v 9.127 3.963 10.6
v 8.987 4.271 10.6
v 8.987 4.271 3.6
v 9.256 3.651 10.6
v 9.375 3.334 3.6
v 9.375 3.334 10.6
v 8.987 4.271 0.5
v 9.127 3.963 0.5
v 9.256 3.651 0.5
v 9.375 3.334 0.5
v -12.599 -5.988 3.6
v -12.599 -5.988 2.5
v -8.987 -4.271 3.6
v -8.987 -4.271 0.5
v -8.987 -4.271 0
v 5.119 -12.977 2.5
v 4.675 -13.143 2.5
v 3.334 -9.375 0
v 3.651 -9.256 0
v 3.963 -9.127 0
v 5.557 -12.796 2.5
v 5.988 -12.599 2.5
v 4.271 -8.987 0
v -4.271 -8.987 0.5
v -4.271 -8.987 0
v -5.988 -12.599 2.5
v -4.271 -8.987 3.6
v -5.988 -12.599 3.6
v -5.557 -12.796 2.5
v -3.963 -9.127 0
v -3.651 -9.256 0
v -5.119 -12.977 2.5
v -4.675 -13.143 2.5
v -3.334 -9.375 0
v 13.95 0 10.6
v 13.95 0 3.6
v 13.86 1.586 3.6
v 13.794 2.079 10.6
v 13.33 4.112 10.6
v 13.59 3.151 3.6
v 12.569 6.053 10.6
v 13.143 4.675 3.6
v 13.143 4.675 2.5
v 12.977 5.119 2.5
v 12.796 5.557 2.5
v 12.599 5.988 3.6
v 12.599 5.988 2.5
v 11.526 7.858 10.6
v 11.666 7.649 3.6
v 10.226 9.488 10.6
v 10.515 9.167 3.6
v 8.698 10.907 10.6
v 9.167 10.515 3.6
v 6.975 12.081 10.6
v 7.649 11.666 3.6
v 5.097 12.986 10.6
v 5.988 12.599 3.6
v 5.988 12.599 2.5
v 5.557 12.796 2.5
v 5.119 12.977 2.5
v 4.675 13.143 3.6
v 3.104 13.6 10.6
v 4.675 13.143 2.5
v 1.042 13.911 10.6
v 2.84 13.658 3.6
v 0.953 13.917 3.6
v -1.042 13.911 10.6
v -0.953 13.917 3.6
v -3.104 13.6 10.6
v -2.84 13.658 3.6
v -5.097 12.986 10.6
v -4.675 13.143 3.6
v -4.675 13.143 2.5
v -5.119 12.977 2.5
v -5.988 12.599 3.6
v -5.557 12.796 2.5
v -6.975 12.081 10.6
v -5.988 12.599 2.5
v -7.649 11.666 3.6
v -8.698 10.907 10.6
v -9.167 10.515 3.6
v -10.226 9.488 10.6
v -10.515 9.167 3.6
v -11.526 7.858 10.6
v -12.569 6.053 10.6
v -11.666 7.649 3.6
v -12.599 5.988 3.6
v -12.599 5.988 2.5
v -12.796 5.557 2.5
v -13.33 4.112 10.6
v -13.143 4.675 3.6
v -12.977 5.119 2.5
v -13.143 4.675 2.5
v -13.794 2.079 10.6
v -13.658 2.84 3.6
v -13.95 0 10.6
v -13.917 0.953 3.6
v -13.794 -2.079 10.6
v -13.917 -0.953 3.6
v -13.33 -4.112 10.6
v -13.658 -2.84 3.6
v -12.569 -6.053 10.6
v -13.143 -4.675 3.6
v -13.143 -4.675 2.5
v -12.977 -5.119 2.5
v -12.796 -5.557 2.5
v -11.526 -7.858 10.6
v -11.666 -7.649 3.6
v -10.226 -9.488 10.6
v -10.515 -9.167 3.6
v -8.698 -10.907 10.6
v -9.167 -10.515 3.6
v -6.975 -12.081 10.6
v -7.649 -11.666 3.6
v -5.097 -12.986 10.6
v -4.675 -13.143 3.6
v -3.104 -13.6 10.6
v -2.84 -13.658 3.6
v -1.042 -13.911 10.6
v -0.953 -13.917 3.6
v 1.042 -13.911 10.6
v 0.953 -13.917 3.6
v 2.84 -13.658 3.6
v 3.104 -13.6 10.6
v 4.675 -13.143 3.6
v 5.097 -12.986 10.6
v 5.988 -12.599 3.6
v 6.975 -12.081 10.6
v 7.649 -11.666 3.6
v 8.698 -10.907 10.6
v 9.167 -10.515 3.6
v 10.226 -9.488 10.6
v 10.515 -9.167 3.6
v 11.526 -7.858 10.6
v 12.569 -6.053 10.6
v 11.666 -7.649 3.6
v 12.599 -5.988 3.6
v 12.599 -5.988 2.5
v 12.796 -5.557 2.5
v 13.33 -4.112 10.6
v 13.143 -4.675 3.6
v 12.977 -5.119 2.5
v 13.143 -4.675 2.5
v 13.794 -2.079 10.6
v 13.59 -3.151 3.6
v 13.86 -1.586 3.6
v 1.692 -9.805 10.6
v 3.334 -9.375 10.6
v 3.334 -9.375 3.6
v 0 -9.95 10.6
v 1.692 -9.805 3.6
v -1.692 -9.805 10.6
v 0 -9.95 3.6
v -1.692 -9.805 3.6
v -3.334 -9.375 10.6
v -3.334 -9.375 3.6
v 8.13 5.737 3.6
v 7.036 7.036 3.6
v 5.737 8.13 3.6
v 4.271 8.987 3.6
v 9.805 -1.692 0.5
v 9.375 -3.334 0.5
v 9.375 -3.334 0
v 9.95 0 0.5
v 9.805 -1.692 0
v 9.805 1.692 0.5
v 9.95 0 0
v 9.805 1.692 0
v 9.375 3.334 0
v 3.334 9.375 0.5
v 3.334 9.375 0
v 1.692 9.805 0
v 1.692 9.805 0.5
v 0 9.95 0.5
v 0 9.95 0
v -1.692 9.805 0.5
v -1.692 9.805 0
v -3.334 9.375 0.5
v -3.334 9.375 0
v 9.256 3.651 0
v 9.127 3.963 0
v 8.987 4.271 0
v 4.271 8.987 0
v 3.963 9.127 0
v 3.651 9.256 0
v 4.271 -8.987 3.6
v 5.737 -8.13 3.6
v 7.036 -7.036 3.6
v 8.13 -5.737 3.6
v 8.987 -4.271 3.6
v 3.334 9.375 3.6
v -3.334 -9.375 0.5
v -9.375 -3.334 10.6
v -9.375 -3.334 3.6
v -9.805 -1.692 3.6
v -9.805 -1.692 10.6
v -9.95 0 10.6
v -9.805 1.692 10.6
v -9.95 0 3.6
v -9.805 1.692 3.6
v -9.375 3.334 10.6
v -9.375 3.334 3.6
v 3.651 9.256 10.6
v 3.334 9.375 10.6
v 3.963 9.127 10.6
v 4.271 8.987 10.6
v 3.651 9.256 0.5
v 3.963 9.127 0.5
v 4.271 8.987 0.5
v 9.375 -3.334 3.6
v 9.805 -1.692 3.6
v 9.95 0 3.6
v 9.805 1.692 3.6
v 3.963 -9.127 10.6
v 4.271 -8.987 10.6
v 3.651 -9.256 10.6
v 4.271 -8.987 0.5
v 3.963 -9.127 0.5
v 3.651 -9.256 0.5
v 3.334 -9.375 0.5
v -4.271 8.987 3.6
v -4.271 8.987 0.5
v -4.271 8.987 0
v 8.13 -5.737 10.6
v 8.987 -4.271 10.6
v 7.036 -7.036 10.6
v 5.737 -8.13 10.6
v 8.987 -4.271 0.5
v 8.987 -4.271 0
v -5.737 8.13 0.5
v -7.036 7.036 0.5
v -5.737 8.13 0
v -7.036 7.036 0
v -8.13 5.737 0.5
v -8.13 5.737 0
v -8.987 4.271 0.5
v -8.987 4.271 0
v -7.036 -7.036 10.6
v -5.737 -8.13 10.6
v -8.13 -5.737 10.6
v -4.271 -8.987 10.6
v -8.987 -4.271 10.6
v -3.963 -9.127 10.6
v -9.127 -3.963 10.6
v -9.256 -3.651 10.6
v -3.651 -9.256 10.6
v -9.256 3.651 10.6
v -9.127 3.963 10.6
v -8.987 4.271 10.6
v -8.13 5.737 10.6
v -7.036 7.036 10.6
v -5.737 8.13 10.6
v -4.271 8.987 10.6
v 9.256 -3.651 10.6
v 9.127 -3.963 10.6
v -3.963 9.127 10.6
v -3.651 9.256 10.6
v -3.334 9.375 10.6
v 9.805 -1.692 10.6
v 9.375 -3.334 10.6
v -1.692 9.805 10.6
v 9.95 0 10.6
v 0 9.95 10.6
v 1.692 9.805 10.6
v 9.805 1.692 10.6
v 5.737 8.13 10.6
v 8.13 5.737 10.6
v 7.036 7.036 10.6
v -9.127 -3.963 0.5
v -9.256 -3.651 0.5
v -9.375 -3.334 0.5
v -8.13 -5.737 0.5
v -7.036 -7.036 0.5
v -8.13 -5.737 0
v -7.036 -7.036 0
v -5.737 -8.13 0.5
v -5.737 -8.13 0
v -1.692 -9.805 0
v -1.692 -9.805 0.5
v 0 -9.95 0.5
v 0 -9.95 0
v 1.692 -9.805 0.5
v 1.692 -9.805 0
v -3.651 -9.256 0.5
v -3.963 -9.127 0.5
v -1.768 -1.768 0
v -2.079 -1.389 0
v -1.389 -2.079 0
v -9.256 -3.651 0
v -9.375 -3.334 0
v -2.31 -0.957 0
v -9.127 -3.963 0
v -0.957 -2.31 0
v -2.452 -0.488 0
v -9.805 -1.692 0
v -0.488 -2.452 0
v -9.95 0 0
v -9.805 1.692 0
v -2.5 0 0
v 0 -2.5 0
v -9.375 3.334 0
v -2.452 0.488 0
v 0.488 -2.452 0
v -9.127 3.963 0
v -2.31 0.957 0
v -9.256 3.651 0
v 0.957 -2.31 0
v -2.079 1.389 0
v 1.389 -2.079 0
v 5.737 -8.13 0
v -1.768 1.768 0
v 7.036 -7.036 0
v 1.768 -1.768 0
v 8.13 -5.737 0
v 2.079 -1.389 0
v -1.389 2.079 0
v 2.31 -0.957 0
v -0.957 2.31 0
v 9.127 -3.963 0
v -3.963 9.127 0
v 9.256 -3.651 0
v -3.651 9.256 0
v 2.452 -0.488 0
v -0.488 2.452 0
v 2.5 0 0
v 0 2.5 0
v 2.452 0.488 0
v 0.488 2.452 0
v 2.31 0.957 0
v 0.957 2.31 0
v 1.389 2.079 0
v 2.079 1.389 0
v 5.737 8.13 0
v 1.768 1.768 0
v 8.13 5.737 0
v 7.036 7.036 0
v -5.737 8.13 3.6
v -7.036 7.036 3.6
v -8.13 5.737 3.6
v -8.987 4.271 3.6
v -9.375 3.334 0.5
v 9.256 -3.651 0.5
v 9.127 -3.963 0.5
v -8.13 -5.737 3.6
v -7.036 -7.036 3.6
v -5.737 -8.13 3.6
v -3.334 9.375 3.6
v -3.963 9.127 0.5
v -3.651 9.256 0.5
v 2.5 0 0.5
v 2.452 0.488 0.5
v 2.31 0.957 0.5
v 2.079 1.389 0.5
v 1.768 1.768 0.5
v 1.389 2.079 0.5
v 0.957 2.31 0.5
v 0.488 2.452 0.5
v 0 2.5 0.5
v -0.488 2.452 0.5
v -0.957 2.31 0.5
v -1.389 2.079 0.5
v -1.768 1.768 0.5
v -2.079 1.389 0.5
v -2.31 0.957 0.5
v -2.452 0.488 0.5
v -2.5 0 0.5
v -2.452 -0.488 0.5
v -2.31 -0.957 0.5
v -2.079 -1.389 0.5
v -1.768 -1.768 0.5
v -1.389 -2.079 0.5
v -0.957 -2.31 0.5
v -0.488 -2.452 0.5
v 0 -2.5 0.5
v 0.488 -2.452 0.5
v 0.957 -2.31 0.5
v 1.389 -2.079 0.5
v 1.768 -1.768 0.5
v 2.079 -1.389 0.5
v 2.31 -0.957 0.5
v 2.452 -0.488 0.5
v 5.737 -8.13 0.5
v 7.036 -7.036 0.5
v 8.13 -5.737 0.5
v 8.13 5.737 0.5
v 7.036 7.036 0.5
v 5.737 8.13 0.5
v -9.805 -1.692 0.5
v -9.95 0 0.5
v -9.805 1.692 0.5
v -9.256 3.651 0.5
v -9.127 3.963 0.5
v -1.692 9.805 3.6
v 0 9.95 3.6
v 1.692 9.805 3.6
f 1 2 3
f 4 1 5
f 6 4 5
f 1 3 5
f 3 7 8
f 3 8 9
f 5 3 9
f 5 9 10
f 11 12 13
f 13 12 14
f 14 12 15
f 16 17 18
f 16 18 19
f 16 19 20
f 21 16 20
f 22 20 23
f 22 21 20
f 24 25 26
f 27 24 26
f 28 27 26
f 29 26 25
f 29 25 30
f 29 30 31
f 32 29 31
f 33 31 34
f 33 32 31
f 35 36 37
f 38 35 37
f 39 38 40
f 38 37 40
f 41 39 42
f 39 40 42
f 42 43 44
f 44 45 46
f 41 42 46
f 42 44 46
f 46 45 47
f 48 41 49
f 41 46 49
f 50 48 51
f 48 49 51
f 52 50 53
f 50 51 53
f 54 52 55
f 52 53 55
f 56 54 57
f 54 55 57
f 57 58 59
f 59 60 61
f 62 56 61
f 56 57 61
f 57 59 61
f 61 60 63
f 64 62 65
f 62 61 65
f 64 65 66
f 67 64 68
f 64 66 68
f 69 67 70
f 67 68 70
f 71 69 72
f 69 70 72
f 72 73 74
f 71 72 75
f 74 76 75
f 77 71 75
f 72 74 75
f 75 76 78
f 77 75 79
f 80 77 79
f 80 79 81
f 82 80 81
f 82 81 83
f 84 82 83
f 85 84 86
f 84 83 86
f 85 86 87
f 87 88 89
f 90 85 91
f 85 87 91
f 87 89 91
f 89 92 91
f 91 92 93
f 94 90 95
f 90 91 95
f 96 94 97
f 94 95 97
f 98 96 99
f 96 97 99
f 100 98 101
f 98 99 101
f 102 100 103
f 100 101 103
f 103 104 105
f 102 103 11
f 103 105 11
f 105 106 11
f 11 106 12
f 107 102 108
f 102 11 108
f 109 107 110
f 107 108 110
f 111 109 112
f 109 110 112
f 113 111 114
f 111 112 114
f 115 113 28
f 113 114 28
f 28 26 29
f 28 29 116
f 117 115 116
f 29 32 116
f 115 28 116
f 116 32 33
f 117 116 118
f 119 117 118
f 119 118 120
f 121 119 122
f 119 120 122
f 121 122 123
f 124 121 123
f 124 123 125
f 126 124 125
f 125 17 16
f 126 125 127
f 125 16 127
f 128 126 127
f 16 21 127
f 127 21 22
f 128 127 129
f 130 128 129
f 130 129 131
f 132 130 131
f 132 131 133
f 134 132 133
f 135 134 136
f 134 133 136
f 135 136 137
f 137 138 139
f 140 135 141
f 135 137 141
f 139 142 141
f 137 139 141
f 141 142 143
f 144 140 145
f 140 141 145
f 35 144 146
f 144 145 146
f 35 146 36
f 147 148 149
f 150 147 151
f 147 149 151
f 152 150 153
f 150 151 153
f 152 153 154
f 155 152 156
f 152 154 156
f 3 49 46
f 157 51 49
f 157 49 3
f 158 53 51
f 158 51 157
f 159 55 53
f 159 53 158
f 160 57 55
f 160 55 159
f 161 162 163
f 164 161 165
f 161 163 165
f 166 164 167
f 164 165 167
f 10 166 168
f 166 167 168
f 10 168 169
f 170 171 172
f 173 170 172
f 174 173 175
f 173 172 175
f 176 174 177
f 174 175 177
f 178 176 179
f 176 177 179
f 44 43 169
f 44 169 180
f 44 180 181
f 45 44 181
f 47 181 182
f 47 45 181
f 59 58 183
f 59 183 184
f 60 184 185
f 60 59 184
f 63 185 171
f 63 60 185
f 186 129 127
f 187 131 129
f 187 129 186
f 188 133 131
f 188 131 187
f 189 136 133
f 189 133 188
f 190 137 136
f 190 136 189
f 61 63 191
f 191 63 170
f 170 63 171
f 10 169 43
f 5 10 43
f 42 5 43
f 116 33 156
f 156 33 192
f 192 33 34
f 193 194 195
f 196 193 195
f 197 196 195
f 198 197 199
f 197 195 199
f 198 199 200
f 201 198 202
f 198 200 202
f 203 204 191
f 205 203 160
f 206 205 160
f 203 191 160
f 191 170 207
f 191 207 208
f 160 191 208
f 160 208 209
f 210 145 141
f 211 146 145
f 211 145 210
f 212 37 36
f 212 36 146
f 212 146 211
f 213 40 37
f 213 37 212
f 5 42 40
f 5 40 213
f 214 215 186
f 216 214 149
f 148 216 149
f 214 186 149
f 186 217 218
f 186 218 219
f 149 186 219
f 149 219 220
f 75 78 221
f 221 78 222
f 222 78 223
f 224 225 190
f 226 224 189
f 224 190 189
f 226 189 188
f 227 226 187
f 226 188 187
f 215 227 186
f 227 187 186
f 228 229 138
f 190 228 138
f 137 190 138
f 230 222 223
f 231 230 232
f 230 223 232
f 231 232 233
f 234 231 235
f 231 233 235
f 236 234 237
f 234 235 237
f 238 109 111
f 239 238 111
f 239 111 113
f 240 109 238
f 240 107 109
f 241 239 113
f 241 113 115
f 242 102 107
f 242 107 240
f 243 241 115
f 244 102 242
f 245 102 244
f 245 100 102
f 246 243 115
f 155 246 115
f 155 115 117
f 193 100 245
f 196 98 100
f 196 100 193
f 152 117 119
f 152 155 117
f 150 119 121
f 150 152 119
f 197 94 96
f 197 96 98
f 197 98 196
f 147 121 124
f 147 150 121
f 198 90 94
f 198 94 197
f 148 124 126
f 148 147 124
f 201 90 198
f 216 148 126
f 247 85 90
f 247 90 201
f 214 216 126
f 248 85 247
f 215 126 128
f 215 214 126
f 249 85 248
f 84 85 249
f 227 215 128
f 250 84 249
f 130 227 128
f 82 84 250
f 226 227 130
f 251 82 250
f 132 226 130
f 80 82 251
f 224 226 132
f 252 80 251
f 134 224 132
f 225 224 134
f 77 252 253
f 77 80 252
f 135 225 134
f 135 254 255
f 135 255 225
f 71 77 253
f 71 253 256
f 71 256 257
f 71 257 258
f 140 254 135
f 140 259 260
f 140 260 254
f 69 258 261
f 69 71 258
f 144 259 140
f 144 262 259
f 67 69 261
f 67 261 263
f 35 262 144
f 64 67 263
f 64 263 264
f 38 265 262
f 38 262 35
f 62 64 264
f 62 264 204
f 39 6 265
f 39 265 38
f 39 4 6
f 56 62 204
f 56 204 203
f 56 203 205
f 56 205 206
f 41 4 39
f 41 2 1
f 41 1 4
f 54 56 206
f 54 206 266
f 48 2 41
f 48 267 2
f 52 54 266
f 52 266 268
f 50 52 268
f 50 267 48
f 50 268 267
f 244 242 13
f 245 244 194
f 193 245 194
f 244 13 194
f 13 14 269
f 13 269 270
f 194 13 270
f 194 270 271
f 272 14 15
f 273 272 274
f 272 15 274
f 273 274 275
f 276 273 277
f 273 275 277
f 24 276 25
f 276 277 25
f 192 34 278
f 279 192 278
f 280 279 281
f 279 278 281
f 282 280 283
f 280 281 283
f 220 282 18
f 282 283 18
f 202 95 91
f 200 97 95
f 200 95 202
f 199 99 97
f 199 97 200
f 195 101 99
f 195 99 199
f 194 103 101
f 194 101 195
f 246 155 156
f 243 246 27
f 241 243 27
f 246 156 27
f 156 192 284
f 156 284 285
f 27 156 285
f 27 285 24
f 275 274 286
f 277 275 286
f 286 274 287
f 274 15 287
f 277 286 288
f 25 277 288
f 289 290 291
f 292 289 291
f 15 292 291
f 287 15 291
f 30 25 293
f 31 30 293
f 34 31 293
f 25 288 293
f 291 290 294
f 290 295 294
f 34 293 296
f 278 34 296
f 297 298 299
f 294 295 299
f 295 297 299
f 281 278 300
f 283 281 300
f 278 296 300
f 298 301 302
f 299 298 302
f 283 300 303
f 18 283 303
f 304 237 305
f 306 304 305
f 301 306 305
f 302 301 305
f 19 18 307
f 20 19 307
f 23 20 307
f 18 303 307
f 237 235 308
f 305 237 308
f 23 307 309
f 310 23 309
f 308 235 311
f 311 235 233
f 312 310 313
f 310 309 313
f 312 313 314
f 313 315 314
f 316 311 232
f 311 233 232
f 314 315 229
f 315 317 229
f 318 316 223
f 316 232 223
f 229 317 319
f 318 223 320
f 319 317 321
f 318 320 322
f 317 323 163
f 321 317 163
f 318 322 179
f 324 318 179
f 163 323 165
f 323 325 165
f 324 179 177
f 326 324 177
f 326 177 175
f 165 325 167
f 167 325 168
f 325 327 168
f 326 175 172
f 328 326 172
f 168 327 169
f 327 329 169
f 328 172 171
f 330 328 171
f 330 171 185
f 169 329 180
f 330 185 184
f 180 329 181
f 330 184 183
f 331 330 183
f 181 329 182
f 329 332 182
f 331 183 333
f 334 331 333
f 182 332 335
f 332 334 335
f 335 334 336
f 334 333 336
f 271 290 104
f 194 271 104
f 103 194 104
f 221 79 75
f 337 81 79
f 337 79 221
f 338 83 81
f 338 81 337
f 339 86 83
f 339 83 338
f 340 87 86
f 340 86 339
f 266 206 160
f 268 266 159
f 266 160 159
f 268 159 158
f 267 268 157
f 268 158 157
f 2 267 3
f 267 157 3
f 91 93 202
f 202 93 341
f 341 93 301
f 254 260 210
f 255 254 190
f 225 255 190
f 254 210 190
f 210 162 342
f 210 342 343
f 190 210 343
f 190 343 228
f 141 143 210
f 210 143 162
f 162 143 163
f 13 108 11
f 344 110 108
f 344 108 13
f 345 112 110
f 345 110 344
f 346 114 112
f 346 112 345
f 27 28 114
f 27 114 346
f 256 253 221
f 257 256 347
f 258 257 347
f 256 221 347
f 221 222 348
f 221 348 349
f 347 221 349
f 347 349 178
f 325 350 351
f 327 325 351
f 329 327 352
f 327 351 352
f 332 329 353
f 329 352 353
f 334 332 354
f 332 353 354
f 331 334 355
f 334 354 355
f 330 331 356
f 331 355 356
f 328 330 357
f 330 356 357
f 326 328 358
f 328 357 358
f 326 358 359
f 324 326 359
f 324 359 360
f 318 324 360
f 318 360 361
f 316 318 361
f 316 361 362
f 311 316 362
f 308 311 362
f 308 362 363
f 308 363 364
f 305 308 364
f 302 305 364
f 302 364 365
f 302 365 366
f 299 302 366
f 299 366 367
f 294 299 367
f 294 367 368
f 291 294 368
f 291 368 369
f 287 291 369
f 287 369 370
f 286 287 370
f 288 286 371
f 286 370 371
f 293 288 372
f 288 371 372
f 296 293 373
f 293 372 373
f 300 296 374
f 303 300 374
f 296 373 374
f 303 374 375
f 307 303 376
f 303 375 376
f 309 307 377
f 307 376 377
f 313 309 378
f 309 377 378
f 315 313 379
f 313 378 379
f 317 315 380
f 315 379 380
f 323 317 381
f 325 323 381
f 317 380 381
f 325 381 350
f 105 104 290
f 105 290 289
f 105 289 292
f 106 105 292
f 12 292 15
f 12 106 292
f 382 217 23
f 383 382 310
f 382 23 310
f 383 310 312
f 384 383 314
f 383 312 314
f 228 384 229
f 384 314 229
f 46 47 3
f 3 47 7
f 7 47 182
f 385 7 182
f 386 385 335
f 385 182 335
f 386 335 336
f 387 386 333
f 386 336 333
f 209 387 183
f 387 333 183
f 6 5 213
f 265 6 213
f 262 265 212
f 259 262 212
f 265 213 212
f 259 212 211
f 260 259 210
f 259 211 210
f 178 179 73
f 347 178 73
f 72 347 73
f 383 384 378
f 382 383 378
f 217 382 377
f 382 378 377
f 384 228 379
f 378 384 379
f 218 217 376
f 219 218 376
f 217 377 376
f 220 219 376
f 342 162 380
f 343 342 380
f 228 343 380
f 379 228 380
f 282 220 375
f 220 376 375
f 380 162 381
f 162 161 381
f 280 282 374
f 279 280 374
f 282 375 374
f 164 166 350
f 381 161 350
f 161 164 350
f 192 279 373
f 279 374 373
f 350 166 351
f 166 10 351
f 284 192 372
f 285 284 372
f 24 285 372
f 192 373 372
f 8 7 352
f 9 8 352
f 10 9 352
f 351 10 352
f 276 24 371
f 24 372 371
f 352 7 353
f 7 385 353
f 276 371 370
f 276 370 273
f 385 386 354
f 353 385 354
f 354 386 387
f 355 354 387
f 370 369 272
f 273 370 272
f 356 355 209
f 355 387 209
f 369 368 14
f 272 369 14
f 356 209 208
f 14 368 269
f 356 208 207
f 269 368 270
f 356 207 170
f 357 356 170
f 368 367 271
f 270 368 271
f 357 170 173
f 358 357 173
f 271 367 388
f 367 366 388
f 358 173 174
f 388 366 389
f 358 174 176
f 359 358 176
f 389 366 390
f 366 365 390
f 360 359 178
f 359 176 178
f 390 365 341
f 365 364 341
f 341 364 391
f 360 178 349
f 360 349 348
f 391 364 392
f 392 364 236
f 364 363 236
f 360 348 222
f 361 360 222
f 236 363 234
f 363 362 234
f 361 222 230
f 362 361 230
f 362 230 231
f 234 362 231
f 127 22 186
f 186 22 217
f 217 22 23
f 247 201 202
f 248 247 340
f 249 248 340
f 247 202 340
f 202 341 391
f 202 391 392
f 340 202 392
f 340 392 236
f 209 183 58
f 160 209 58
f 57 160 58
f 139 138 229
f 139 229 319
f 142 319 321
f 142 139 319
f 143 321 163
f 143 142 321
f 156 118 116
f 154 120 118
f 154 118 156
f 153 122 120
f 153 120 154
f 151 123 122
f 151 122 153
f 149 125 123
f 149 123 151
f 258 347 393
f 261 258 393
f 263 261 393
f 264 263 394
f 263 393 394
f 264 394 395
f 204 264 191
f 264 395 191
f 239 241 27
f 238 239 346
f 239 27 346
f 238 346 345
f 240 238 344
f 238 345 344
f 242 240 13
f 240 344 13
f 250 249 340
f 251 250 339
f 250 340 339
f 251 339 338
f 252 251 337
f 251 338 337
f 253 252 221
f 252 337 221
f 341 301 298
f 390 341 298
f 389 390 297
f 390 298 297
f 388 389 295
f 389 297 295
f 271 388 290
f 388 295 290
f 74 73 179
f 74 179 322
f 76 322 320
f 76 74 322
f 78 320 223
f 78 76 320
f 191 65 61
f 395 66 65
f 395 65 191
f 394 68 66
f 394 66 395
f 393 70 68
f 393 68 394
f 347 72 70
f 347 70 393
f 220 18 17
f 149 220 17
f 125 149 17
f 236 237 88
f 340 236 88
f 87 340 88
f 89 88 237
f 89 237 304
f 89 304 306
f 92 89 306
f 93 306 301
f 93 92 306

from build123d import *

# Parameters (mm, degrees)
IZIM1_R                     = 13.95
Y_KSEKLIK_EKSTR_ZYON1_DEPTH = 10.6
PAH1_SIZE                   = 4
PAH1_SIZE2                  = 2.5
IZIM3_R                     = 2.5
KES_EKSTR_ZYON1_DEPTH       = 10.6
KES_EKSTR_ZYON2_DEPTH       = 3.6
DAIRESEL_KAPLAMA1_COUNT     = 8
KES_EKSTR_ZYON3_DEPTH       = 10.1


with BuildPart() as part:
    # Çizim1 → Yükseklik-Ekstrüzyon1 (new body)
    with BuildSketch(Plane.XY):
        Circle(IZIM1_R)
    extrude(amount=Y_KSEKLIK_EKSTR_ZYON1_DEPTH)

    # Pah1
    pah1_edges = [part.edges().sort_by_distance(p)[0] for p in [
        (-13.95, 0, 0),
    ]]
    pah1_side = [part.faces().sort_by_distance(p)[0] for p in [
        (0, 0, 0),
    ]]
    chamfer(pah1_edges, length=PAH1_SIZE, length2=PAH1_SIZE2, reference=pah1_side[0])

    # Çizim3 → Kes-Ekstrüzyon1 (cut)
    with BuildSketch(Plane.XY.offset(10.6)):
        Circle(IZIM3_R)
    extrude(amount=-KES_EKSTR_ZYON1_DEPTH, mode=Mode.SUBTRACT)

    # Çizim5 → Kes-Ekstrüzyon2 (cut)
    with BuildSketch(Plane(origin=(0, 0, 0), x_dir=(-1, 0, 0), z_dir=(0, 0, -1))):
        with BuildLine():
            Line((-9.374663228, 3.334394903), (-13.143372063, 4.674855165))
            ThreePointArc((-13.143372063, 4.674855165), (-13.95, 0), (-13.143372063, -4.674855165))
            Line((-13.143372063, -4.674855165), (-9.374663228, -3.334394903))
            ThreePointArc((-9.374663228, -3.334394903), (-9.95, 0), (-9.374663228, 3.334394903))
        make_face()
    kes_ekstr_zyon2 = extrude(amount=-KES_EKSTR_ZYON2_DEPTH, mode=Mode.SUBTRACT)

    # Dairesel Kaplama1: Kes-Ekstrüzyon2 ×8 about axis
    dairesel_kaplama1_axis = Axis((0, 0, 0), (0, 0, 1))
    for i in range(1, DAIRESEL_KAPLAMA1_COUNT):
        add(kes_ekstr_zyon2.rotate(dairesel_kaplama1_axis, i * 360 / DAIRESEL_KAPLAMA1_COUNT), mode=Mode.SUBTRACT)

    # Çizim8 → Kes-Ekstrüzyon3 (cut)
    with BuildSketch(Plane(origin=(0, 0, 0.5), x_dir=(-1, 0, 0), z_dir=(0, 0, -1))):
        with BuildLine():
            ThreePointArc((-9.374663228, -3.334394903), (-9.192601348, -3.807700152), (-8.986661187, -4.271114693))
            ThreePointArc((-8.986661187, -4.271114693), (-7.035712473, -7.035712473), (-4.271114693, -8.986661187))
            ThreePointArc((-4.271114693, -8.986661187), (-3.807700152, -9.192601348), (-3.334394903, -9.374663228))
            ThreePointArc((-3.334394903, -9.374663228), (0, -9.95), (3.334394903, -9.374663228))
            ThreePointArc((3.334394903, -9.374663228), (3.807700152, -9.192601348), (4.271114693, -8.986661187))
            ThreePointArc((4.271114693, -8.986661187), (7.035712473, -7.035712473), (8.986661187, -4.271114693))
            ThreePointArc((8.986661187, -4.271114693), (9.192601348, -3.807700152), (9.374663228, -3.334394903))
            ThreePointArc((9.374663228, -3.334394903), (9.95, 0), (9.374663228, 3.334394903))
            ThreePointArc((9.374663228, 3.334394903), (9.192601348, 3.807700152), (8.986661187, 4.271114693))
            ThreePointArc((8.986661187, 4.271114693), (7.035712473, 7.035712473), (4.271114693, 8.986661187))
            ThreePointArc((4.271114693, 8.986661187), (3.807700152, 9.192601348), (3.334394903, 9.374663228))
            ThreePointArc((3.334394903, 9.374663228), (0, 9.95), (-3.334394903, 9.374663228))
            ThreePointArc((-3.334394903, 9.374663228), (-3.807700152, 9.192601348), (-4.271114693, 8.986661187))
            ThreePointArc((-4.271114693, 8.986661187), (-7.035712473, 7.035712473), (-8.986661187, 4.271114693))
            ThreePointArc((-8.986661187, 4.271114693), (-9.192601348, 3.807700152), (-9.374663228, 3.334394903))
            ThreePointArc((-9.374663228, 3.334394903), (-9.95, 0), (-9.374663228, -3.334394903))
        make_face()
    extrude(amount=-KES_EKSTR_ZYON3_DEPTH, mode=Mode.SUBTRACT)


solid = part.part
